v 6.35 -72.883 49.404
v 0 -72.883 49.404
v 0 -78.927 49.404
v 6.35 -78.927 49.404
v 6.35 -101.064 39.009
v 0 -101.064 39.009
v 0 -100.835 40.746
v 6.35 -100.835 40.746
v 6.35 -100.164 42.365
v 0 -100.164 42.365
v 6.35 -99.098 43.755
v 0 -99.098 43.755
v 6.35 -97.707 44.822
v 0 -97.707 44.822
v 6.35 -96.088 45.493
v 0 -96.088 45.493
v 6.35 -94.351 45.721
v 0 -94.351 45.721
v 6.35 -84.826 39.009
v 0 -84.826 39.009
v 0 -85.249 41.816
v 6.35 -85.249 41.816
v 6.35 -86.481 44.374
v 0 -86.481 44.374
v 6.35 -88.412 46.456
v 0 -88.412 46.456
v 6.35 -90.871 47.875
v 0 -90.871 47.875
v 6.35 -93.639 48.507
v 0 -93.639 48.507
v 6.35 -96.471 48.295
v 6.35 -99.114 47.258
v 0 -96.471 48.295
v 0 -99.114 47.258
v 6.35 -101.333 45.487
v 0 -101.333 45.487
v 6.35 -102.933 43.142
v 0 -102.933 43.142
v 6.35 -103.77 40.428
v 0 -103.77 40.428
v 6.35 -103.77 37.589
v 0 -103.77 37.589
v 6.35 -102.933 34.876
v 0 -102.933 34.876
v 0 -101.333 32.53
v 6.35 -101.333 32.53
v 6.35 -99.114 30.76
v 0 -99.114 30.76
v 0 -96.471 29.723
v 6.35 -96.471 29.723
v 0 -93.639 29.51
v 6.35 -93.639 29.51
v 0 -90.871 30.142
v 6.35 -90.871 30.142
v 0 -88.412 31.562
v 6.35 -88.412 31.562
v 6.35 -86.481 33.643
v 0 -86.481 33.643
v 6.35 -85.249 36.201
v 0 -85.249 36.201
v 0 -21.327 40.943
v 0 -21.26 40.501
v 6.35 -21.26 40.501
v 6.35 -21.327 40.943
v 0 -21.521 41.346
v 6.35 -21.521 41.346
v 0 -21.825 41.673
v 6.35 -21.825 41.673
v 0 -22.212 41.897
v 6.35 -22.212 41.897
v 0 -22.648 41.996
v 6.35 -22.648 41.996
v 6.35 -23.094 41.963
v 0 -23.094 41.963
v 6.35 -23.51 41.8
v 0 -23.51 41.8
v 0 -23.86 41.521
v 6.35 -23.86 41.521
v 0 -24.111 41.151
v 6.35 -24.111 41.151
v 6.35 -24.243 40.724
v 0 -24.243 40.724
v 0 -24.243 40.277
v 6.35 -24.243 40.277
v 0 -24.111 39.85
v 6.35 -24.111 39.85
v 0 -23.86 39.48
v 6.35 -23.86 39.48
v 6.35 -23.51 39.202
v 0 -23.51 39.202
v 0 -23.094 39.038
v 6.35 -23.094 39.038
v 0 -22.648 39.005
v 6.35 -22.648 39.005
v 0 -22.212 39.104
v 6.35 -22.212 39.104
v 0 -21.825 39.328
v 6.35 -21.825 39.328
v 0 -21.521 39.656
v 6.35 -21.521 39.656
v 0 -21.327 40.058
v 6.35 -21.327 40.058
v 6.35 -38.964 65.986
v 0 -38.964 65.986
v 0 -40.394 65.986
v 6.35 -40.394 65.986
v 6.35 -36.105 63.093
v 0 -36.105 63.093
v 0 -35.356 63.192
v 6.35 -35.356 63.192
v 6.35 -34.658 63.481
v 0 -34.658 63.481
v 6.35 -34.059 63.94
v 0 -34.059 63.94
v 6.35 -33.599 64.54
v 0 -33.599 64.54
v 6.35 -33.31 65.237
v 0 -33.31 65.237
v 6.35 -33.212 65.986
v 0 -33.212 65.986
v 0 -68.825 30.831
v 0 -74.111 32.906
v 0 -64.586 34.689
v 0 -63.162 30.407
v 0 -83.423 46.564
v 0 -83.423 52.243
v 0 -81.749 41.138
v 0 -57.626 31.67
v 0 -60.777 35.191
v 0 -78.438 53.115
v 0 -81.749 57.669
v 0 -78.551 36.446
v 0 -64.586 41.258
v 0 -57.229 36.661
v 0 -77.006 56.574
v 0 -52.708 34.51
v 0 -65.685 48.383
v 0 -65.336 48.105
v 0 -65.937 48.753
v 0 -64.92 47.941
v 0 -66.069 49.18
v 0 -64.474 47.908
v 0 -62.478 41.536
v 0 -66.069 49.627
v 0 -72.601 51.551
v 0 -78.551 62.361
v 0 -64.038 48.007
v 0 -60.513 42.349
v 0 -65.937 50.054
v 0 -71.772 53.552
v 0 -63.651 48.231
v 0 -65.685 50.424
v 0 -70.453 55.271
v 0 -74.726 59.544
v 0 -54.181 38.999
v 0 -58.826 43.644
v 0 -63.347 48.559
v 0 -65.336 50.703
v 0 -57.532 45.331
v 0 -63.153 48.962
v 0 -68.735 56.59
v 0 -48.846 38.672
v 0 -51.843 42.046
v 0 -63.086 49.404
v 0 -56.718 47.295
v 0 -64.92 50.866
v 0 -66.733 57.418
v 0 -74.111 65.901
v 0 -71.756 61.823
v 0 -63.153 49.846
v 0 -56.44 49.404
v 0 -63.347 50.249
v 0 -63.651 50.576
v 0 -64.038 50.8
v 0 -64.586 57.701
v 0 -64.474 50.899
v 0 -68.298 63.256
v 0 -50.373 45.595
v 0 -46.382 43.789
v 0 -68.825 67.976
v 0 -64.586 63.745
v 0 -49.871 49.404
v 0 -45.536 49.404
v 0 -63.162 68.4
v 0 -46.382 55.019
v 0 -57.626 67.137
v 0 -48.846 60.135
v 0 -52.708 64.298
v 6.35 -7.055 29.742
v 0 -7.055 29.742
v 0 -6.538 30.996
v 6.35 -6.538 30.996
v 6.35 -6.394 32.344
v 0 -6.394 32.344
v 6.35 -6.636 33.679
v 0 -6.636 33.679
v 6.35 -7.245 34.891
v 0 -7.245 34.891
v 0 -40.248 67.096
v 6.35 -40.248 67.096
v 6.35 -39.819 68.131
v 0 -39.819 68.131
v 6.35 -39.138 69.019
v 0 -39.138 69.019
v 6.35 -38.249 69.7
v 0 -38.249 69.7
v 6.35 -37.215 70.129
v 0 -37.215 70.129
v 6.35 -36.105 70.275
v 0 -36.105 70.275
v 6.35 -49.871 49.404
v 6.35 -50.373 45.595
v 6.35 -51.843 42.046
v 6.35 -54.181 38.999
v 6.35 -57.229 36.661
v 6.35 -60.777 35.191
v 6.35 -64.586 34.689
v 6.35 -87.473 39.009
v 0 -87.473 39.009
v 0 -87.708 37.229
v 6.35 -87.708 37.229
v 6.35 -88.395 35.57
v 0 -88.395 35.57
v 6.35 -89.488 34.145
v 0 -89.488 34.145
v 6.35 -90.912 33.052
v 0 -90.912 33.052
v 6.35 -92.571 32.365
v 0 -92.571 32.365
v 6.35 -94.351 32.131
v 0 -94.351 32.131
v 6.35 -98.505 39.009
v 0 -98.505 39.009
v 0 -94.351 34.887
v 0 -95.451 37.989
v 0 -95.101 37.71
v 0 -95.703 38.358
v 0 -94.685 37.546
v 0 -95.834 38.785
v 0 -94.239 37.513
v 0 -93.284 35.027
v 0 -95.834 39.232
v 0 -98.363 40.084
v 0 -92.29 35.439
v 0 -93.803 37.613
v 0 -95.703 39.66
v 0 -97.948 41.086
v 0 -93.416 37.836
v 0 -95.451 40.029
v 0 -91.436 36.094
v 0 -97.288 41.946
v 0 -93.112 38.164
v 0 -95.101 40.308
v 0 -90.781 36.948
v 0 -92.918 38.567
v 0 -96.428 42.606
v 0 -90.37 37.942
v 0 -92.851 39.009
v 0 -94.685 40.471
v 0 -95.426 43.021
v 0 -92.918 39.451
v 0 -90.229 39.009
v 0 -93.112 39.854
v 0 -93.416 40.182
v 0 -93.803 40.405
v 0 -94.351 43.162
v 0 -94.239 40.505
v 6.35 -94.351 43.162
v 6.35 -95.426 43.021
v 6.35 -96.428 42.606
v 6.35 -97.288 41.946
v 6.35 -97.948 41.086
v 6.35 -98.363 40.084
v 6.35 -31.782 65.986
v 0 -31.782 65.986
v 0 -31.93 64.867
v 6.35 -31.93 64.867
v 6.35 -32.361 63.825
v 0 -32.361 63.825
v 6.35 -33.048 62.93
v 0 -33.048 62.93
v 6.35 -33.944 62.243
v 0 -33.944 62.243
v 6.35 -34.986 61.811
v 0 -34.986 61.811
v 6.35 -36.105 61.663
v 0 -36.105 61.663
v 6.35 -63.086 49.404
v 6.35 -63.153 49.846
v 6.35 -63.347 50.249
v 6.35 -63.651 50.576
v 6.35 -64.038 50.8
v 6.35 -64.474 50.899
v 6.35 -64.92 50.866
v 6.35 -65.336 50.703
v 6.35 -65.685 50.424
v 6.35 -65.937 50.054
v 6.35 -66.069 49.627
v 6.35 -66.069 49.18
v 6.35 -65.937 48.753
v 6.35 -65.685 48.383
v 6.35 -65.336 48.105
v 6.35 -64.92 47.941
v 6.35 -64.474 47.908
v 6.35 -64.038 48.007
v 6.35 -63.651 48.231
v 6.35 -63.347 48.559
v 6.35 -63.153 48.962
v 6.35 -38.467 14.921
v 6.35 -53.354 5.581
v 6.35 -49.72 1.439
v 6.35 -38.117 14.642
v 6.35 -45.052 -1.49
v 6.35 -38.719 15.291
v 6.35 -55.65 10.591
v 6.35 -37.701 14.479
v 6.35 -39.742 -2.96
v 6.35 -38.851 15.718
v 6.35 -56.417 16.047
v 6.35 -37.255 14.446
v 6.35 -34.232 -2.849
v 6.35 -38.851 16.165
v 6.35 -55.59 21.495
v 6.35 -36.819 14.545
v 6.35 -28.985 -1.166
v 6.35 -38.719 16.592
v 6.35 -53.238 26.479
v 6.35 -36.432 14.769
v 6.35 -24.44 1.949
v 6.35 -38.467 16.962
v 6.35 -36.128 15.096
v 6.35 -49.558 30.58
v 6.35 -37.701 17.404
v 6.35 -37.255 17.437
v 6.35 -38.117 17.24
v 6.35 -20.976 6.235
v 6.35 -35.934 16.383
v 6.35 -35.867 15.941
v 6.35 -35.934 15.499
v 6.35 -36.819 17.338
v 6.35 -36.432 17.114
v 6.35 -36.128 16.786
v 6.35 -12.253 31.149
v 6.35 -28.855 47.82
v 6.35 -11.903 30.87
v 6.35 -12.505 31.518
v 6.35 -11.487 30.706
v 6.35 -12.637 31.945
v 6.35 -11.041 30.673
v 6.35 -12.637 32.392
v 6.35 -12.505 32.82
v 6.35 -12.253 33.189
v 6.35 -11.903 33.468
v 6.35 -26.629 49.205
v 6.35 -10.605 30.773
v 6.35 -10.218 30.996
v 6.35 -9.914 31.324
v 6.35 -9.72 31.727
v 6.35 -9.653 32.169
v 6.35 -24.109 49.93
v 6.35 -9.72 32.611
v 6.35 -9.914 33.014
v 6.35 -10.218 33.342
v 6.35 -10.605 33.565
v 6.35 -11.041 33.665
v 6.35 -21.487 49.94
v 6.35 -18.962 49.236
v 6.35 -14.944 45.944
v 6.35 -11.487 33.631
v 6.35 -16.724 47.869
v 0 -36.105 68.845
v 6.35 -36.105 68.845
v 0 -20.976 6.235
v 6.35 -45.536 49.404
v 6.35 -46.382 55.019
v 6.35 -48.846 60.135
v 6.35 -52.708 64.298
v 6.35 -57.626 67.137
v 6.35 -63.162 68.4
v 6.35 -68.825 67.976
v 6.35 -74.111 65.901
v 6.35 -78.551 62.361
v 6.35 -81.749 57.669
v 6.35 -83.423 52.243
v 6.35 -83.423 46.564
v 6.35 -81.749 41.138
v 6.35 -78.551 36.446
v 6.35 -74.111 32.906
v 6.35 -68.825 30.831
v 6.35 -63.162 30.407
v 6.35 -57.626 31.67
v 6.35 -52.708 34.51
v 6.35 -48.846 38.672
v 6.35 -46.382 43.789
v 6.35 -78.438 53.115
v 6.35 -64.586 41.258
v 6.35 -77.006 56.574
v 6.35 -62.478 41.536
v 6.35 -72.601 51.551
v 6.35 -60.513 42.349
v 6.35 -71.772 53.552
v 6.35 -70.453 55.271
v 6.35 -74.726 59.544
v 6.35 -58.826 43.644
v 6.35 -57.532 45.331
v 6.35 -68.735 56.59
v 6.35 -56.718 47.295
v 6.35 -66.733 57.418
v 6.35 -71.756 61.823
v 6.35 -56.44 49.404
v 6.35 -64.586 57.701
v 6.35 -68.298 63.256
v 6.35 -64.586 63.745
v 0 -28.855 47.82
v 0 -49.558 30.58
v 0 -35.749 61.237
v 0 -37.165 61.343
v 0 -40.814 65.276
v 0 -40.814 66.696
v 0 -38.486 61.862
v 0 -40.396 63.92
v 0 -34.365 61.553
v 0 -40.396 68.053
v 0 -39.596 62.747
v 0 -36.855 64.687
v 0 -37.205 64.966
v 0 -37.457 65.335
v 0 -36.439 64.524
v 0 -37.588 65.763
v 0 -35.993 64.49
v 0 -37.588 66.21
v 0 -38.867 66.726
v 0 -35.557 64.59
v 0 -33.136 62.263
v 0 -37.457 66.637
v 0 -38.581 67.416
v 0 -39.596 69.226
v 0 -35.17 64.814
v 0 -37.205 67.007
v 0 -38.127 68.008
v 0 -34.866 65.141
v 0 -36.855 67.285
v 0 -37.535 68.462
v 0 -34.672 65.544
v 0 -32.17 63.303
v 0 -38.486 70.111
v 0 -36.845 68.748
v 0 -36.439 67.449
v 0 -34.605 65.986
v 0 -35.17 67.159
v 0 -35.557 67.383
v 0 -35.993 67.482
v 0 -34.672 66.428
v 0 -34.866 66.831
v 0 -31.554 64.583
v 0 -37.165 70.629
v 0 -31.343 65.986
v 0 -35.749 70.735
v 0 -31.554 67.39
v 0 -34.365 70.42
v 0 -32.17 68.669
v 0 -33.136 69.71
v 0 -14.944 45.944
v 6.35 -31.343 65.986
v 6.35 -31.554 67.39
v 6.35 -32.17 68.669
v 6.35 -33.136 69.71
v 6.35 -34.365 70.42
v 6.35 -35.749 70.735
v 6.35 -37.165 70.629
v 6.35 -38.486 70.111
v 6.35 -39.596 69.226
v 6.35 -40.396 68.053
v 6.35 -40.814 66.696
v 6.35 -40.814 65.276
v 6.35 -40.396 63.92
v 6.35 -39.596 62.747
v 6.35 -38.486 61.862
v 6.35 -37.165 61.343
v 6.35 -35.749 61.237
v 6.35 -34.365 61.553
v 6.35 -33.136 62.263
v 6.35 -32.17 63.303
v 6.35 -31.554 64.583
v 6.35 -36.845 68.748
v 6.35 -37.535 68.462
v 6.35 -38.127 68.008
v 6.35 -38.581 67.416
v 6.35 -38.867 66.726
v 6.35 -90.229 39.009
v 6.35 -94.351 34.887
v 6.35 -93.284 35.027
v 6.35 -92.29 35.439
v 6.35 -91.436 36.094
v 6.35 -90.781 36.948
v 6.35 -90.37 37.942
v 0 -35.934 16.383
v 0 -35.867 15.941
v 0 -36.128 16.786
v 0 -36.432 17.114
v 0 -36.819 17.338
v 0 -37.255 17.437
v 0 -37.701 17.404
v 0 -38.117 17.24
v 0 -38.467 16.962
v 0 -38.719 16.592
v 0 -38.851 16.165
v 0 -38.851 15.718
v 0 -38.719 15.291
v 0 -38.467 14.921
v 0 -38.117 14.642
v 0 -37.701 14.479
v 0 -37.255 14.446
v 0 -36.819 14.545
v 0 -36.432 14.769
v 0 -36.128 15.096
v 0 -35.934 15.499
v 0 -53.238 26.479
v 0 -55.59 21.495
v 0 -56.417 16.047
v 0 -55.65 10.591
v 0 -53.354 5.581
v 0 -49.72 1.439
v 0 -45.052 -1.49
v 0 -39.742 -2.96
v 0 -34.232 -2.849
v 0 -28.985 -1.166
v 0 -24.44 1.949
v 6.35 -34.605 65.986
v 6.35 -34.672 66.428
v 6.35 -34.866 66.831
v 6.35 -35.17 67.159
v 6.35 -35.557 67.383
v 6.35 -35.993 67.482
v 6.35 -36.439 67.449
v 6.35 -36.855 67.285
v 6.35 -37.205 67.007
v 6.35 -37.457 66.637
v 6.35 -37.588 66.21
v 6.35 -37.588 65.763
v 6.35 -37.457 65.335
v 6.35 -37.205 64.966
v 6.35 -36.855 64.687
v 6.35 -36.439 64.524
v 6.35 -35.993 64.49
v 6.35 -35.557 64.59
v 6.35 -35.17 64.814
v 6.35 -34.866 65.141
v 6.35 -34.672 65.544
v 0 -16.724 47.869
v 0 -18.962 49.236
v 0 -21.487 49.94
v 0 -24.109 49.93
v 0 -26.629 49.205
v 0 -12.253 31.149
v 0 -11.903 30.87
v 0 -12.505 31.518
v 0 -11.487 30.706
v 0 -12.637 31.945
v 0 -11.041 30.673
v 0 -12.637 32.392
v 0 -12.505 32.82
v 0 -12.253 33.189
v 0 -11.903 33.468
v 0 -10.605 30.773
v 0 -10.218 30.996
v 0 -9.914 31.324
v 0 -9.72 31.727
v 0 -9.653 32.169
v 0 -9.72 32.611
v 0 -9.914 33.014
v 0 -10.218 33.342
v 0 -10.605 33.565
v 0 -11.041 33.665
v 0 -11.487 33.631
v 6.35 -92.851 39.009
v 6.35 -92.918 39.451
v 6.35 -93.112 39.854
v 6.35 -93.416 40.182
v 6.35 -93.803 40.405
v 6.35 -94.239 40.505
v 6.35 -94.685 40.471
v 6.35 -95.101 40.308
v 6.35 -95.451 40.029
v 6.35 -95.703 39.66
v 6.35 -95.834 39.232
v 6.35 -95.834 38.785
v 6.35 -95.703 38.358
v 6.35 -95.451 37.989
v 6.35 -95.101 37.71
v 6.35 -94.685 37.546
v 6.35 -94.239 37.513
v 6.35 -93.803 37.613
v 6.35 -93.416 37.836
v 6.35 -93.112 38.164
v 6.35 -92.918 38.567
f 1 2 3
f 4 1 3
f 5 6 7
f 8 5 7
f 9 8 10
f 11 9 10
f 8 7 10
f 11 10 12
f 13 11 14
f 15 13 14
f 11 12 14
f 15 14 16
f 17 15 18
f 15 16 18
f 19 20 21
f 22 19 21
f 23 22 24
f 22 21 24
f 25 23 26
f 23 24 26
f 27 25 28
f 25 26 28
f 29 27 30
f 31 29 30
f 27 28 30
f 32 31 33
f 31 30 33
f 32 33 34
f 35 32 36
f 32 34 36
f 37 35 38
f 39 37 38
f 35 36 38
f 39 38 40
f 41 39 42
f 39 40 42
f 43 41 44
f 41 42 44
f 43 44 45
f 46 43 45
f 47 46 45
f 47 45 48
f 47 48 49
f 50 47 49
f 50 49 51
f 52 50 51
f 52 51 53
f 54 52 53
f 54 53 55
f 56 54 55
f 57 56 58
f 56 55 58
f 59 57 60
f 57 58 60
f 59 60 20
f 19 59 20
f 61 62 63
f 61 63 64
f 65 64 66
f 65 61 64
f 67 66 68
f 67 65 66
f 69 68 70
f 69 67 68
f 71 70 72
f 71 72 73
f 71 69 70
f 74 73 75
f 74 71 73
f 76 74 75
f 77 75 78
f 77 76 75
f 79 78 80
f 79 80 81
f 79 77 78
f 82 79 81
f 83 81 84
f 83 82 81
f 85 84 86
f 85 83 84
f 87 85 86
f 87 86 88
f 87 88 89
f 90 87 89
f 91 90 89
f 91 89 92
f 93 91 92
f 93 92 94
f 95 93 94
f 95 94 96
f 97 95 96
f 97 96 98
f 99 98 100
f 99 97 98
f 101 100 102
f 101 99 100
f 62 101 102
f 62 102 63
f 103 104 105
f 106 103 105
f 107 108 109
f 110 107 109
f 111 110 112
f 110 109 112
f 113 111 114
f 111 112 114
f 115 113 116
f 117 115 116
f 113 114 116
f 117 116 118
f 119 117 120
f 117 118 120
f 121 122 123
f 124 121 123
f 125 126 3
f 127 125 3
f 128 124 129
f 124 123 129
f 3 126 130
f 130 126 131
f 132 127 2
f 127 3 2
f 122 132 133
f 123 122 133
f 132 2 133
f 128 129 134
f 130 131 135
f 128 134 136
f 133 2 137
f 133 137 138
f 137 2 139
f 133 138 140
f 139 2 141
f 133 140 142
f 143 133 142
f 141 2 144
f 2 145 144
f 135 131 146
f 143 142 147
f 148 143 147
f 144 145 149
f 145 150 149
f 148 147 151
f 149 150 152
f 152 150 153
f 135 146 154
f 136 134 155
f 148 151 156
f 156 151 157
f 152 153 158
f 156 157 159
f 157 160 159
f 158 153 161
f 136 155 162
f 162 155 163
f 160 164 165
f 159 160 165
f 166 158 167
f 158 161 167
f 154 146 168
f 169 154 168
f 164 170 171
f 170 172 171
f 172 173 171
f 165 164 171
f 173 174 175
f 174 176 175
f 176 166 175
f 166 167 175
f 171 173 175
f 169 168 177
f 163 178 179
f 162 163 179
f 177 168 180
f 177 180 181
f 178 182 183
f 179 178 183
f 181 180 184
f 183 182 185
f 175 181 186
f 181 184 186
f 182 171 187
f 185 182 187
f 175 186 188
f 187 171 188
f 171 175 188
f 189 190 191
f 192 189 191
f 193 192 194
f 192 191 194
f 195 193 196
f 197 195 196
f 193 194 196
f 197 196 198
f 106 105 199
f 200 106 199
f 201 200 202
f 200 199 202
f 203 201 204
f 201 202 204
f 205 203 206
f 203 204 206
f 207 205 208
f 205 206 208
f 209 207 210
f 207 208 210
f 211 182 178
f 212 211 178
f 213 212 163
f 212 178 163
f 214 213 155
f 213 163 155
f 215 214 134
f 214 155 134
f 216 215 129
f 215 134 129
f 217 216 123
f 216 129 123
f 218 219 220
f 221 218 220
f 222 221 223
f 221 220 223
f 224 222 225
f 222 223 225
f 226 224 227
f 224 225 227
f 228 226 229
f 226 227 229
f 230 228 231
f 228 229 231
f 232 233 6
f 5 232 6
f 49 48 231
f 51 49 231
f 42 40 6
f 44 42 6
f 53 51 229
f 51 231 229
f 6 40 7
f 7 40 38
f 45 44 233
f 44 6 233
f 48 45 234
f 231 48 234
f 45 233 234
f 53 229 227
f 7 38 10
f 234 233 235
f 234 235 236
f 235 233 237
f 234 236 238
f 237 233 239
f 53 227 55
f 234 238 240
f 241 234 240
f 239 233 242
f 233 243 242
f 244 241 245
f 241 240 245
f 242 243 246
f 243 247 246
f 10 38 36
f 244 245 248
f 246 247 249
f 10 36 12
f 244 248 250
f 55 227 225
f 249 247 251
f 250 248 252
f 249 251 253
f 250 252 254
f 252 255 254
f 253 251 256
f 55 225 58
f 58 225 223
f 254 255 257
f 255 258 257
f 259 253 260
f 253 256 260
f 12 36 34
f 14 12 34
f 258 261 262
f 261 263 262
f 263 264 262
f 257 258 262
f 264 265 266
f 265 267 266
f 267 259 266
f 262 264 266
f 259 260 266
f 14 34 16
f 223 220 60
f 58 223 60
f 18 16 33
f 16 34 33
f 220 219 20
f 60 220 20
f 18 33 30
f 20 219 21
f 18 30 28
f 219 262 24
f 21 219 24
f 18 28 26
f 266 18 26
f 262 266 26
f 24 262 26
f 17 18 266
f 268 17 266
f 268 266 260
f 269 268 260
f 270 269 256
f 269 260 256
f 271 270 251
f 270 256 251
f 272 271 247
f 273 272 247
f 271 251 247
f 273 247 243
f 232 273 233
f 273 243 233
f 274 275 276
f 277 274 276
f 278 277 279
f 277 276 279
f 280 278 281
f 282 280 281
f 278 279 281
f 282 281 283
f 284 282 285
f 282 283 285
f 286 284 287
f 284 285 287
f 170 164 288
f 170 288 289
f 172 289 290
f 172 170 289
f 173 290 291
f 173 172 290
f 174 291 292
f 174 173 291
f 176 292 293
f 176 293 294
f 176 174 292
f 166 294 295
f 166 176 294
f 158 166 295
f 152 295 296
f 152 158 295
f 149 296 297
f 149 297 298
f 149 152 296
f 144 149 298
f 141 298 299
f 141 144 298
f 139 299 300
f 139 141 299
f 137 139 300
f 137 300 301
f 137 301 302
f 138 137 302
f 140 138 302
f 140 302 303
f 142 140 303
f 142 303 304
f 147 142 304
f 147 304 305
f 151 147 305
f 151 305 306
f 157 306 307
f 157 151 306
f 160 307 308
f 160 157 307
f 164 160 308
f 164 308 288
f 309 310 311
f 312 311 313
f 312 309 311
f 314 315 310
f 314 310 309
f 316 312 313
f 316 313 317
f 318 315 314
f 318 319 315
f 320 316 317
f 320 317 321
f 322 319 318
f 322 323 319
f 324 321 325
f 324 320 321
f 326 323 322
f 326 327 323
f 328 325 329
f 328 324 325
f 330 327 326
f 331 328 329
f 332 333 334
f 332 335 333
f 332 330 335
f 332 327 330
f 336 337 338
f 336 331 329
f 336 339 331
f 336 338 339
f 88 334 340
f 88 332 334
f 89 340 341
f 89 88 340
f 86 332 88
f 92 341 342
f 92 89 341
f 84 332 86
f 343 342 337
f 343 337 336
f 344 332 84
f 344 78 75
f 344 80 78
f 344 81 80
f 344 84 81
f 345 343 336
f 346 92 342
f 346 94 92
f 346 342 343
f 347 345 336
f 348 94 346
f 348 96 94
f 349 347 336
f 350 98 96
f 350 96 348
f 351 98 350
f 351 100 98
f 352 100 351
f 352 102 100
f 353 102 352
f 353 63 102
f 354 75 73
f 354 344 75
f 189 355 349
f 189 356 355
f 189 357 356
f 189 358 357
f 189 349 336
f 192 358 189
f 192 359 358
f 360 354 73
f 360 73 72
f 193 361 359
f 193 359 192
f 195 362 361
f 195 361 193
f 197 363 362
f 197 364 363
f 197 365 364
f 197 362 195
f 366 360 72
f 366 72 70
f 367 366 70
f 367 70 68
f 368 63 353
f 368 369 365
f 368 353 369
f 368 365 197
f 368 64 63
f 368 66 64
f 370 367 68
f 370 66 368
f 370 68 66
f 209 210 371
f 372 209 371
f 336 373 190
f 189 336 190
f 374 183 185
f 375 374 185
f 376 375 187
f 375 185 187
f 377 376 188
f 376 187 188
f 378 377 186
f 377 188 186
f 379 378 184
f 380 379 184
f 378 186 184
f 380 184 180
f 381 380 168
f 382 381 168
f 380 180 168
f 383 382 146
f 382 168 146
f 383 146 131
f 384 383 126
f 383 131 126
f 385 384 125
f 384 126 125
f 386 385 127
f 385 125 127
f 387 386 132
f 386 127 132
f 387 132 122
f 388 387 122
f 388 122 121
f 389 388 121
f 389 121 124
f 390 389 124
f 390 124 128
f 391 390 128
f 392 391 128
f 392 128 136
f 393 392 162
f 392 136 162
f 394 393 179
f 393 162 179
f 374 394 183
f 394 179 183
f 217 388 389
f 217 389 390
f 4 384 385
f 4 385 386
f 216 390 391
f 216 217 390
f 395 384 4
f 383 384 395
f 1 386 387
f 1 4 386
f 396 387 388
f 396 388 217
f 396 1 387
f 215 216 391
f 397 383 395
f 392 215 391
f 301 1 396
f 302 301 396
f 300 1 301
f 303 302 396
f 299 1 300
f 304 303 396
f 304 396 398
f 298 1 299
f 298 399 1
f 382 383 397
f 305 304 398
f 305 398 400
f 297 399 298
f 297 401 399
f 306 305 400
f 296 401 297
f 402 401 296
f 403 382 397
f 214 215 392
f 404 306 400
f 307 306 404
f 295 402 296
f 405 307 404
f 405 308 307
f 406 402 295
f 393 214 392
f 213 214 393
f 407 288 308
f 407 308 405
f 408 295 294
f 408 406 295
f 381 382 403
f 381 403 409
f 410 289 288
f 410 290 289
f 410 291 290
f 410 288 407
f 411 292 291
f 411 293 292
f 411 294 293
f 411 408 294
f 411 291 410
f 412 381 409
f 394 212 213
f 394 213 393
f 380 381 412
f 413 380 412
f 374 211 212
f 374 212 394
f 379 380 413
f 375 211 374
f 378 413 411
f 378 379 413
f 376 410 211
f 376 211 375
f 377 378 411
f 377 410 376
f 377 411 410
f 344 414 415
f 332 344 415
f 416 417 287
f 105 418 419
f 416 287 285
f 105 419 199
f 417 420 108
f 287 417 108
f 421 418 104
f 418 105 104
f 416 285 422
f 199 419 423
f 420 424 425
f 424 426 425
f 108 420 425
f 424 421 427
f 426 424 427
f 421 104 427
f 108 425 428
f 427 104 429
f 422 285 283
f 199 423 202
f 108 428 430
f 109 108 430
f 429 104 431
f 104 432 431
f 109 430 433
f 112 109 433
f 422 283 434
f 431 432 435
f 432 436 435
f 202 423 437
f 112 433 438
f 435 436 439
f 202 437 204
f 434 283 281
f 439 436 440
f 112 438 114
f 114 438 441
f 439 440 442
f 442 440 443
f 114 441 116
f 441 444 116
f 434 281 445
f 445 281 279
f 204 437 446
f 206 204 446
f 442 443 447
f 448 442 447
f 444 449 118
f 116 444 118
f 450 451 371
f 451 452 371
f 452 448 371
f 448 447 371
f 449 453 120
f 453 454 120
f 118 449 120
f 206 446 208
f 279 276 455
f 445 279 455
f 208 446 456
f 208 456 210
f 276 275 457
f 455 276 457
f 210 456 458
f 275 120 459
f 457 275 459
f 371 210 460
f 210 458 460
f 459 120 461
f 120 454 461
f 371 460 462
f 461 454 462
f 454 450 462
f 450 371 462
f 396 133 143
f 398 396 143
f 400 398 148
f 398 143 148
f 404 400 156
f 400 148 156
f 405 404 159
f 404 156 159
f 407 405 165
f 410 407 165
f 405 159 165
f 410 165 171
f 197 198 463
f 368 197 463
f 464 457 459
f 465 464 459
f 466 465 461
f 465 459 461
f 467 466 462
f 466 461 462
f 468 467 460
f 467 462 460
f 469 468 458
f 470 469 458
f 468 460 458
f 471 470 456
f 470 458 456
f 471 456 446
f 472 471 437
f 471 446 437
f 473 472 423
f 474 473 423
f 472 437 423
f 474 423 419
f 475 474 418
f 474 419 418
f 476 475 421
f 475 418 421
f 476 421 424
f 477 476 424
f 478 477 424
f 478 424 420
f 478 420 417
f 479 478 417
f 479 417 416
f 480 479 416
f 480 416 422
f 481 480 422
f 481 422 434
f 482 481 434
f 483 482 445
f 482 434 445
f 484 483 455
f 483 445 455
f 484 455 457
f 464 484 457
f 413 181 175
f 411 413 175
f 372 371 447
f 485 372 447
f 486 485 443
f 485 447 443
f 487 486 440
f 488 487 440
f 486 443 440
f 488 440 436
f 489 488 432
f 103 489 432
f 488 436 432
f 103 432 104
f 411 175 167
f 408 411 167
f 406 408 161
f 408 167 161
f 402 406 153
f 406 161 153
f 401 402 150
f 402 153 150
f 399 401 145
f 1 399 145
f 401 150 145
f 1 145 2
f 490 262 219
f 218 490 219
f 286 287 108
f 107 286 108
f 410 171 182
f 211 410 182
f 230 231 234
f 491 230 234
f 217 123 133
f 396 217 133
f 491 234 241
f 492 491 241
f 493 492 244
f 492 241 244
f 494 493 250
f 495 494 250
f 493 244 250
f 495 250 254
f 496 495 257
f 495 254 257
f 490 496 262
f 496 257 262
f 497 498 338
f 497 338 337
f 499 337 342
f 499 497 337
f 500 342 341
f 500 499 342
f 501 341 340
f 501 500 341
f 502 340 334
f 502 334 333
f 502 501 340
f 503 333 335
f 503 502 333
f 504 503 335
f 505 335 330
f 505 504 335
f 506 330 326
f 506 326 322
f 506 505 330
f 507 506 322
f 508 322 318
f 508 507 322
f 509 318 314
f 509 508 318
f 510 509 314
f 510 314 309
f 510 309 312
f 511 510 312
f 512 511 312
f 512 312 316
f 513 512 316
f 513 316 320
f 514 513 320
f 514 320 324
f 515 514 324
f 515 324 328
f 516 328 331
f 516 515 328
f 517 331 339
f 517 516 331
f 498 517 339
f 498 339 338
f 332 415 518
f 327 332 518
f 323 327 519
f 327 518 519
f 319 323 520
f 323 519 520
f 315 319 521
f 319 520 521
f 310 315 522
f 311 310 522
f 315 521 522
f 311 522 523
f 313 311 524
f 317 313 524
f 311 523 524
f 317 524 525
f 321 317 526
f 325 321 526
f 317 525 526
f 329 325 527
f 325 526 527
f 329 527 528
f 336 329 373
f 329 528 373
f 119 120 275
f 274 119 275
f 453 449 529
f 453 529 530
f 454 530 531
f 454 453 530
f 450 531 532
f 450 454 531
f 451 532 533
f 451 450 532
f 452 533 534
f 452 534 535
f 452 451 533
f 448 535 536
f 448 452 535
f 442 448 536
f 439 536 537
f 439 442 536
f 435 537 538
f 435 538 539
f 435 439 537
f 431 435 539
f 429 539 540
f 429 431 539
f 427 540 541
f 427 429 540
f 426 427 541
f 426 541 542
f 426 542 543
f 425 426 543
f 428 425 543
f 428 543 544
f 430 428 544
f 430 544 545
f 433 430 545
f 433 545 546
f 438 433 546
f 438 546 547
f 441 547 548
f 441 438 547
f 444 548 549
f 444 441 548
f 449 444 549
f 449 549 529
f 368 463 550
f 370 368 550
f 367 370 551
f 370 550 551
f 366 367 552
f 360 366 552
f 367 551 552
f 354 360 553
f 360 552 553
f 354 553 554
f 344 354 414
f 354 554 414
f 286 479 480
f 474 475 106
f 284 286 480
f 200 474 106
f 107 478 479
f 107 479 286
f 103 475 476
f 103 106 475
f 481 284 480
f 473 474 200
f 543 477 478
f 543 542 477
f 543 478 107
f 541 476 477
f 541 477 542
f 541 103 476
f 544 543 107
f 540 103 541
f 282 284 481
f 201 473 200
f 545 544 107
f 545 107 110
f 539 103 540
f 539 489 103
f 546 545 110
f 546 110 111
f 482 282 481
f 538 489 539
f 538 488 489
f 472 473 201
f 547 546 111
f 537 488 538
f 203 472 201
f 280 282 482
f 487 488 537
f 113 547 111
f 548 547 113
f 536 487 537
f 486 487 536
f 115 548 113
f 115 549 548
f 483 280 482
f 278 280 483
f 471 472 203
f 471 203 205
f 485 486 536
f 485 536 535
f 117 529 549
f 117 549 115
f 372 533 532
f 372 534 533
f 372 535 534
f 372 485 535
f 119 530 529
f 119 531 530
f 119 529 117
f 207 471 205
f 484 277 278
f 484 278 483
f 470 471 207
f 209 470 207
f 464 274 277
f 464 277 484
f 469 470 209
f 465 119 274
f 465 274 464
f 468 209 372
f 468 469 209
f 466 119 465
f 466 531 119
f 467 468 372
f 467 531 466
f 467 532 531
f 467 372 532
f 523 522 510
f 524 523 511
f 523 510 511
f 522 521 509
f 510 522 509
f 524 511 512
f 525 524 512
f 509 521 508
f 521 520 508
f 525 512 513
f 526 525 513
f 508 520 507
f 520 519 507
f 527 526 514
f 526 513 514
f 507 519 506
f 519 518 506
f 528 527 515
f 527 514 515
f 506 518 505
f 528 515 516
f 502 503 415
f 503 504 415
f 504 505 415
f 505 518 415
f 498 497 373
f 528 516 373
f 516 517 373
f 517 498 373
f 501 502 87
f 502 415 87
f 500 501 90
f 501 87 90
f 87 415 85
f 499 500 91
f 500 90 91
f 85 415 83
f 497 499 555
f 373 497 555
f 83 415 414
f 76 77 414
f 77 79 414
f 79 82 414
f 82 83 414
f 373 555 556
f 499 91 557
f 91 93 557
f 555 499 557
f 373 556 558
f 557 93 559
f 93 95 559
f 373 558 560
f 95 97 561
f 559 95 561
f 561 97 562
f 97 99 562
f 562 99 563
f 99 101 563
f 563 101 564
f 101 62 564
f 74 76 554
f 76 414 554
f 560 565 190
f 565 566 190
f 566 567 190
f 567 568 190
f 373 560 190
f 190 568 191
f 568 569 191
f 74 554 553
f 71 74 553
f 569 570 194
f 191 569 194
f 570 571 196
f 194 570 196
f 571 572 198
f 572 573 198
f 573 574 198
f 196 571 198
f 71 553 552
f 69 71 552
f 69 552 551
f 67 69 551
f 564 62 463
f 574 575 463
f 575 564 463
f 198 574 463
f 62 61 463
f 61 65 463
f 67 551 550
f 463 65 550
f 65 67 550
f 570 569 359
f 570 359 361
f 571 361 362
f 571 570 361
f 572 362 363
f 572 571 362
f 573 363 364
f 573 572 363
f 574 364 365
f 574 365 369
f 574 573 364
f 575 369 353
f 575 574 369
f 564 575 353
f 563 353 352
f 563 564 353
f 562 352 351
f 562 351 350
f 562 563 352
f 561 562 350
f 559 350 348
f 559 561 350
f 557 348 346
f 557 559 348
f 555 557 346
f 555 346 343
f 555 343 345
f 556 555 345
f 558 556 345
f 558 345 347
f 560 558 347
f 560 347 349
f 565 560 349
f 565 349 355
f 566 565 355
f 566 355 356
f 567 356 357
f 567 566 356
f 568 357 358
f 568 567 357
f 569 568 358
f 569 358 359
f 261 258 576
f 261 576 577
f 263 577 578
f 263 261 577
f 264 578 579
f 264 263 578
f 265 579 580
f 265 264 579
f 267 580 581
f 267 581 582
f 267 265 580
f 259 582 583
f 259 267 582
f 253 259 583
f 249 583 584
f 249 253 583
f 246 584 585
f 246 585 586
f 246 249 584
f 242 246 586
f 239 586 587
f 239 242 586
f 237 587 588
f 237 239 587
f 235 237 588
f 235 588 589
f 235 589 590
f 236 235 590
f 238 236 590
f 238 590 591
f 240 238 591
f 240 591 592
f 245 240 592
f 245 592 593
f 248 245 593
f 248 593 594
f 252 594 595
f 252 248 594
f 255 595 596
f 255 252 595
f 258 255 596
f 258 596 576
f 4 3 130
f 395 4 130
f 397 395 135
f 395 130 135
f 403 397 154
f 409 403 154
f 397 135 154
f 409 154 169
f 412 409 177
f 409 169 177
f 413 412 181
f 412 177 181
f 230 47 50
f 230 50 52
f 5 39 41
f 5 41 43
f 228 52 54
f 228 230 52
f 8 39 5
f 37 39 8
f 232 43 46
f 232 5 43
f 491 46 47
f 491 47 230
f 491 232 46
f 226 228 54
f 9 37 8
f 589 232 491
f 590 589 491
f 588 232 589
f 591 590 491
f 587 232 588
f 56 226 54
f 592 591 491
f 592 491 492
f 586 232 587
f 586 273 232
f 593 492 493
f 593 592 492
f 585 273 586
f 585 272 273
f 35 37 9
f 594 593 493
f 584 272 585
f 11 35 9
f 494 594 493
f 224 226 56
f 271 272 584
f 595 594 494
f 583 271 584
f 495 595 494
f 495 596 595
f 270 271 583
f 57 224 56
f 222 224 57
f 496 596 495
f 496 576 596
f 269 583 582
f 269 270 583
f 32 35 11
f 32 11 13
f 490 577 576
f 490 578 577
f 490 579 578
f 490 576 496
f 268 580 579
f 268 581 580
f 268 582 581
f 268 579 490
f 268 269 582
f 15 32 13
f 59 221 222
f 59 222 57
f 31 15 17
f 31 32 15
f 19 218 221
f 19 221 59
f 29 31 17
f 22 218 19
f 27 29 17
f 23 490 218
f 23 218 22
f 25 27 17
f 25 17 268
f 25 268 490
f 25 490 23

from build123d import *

# Parameters (mm, degrees)
F0_R     = 1.499997
F0_R_2   = 9.525
F0_R_3   = 19.05
F0_R_4   = 4.7625
F1_DEPTH = 6.35


with BuildPart() as f1:
    # F0 (on Right) → F1 (new body)
    with BuildSketch(Plane.YZ):
        with BuildLine():
            Line((-20.975642, 6.234786), (-7.0554, 29.742179))
            ThreePointArc((-7.0554, 29.742179), (-6.394042, 32.344319), (-7.245258, 34.890681))
            Line((-7.245258, 34.890681), (-14.943859, 45.944314))
            ThreePointArc((-14.943859, 45.944314), (-21.487185, 49.940161), (-28.855151, 47.820024))
            Line((-28.855151, 47.820024), (-49.557661, 30.580212))
            ThreePointArc((-49.557661, 30.580212), (-49.719906, 1.439088), (-20.975642, 6.234786))
        make_face()
        with Locations((-37.367273, 15.941327)):
            Circle(F0_R, mode=Mode.SUBTRACT)
        with Locations((-11.153307, 32.168815)):
            Circle(F0_R, mode=Mode.SUBTRACT)
        with Locations((-22.759957, 40.500581)):
            Circle(F0_R, mode=Mode.SUBTRACT)
        with Locations((-94.351119, 39.008833)):
            Circle(F0_R_2)
        with Locations((-94.351119, 39.008833)):
            Circle(F0_R, mode=Mode.SUBTRACT)
        with BuildLine():
            Line((-98.504625, 39.008833), (-101.063631, 39.008833))
            ThreePointArc((-101.063631, 39.008833), (-99.097582, 43.755296), (-94.351119, 45.721345))
            Line((-94.351119, 45.721345), (-94.351119, 43.162339))
            ThreePointArc((-94.351119, 43.162339), (-97.288091, 41.945805), (-98.504625, 39.008833))
        make_face(mode=Mode.SUBTRACT)
        with BuildLine():
            ThreePointArc((-87.473325, 39.008833), (-89.487784, 34.145498), (-94.351119, 32.131039))
            Line((-94.351119, 32.131039), (-94.351119, 34.886889))
            ThreePointArc((-94.351119, 34.886889), (-91.436465, 36.094179), (-90.229175, 39.008833))
            Line((-90.229175, 39.008833), (-87.473325, 39.008833))
        make_face(mode=Mode.SUBTRACT)
        with Locations((-64.585872, 49.403638)):
            Circle(F0_R_3)
        with BuildLine():
            Line((-64.585872, 34.689154), (-64.585872, 41.258119))
            ThreePointArc((-64.585872, 41.258119), (-58.826121, 43.643886), (-56.440353, 49.403638))
            Line((-56.440353, 49.403638), (-49.871389, 49.403638))
            ThreePointArc((-49.871389, 49.403638), (-54.181161, 38.998927), (-64.585872, 34.689154))
        make_face(mode=Mode.SUBTRACT)
        with Locations((-64.585872, 49.403638)):
            Circle(F0_R, mode=Mode.SUBTRACT)
        with BuildLine():
            ThreePointArc((-64.585872, 57.7012), (-70.453135, 55.2709), (-72.883435, 49.403638))
            Line((-72.883435, 49.403638), (-78.926884, 49.403638))
            ThreePointArc((-78.926884, 49.403638), (-74.726499, 59.544264), (-64.585872, 63.744649))
            Line((-64.585872, 63.744649), (-64.585872, 57.7012))
        make_face(mode=Mode.SUBTRACT)
        with Locations((-36.105146, 65.986276)):
            Circle(F0_R_4)
        with BuildLine():
            Line((-36.105146, 61.663408), (-36.105146, 63.09294))
            ThreePointArc((-36.105146, 63.09294), (-34.059248, 63.940378), (-33.211809, 65.986276))
            Line((-33.211809, 65.986276), (-31.782278, 65.986276))
            ThreePointArc((-31.782278, 65.986276), (-33.048417, 62.929547), (-36.105146, 61.663408))
        make_face(mode=Mode.SUBTRACT)
        with Locations((-36.105146, 65.986276)):
            Circle(F0_R, mode=Mode.SUBTRACT)
        with BuildLine():
            ThreePointArc((-36.105146, 68.845264), (-38.126756, 68.007886), (-38.964134, 65.986276))
            Line((-38.964134, 65.986276), (-40.393669, 65.986276))
            ThreePointArc((-40.393669, 65.986276), (-39.13759, 69.01872), (-36.105146, 70.274799))
            Line((-36.105146, 70.274799), (-36.105146, 68.845264))
        make_face(mode=Mode.SUBTRACT)
    extrude(amount=F1_DEPTH)


solid = f1.part
